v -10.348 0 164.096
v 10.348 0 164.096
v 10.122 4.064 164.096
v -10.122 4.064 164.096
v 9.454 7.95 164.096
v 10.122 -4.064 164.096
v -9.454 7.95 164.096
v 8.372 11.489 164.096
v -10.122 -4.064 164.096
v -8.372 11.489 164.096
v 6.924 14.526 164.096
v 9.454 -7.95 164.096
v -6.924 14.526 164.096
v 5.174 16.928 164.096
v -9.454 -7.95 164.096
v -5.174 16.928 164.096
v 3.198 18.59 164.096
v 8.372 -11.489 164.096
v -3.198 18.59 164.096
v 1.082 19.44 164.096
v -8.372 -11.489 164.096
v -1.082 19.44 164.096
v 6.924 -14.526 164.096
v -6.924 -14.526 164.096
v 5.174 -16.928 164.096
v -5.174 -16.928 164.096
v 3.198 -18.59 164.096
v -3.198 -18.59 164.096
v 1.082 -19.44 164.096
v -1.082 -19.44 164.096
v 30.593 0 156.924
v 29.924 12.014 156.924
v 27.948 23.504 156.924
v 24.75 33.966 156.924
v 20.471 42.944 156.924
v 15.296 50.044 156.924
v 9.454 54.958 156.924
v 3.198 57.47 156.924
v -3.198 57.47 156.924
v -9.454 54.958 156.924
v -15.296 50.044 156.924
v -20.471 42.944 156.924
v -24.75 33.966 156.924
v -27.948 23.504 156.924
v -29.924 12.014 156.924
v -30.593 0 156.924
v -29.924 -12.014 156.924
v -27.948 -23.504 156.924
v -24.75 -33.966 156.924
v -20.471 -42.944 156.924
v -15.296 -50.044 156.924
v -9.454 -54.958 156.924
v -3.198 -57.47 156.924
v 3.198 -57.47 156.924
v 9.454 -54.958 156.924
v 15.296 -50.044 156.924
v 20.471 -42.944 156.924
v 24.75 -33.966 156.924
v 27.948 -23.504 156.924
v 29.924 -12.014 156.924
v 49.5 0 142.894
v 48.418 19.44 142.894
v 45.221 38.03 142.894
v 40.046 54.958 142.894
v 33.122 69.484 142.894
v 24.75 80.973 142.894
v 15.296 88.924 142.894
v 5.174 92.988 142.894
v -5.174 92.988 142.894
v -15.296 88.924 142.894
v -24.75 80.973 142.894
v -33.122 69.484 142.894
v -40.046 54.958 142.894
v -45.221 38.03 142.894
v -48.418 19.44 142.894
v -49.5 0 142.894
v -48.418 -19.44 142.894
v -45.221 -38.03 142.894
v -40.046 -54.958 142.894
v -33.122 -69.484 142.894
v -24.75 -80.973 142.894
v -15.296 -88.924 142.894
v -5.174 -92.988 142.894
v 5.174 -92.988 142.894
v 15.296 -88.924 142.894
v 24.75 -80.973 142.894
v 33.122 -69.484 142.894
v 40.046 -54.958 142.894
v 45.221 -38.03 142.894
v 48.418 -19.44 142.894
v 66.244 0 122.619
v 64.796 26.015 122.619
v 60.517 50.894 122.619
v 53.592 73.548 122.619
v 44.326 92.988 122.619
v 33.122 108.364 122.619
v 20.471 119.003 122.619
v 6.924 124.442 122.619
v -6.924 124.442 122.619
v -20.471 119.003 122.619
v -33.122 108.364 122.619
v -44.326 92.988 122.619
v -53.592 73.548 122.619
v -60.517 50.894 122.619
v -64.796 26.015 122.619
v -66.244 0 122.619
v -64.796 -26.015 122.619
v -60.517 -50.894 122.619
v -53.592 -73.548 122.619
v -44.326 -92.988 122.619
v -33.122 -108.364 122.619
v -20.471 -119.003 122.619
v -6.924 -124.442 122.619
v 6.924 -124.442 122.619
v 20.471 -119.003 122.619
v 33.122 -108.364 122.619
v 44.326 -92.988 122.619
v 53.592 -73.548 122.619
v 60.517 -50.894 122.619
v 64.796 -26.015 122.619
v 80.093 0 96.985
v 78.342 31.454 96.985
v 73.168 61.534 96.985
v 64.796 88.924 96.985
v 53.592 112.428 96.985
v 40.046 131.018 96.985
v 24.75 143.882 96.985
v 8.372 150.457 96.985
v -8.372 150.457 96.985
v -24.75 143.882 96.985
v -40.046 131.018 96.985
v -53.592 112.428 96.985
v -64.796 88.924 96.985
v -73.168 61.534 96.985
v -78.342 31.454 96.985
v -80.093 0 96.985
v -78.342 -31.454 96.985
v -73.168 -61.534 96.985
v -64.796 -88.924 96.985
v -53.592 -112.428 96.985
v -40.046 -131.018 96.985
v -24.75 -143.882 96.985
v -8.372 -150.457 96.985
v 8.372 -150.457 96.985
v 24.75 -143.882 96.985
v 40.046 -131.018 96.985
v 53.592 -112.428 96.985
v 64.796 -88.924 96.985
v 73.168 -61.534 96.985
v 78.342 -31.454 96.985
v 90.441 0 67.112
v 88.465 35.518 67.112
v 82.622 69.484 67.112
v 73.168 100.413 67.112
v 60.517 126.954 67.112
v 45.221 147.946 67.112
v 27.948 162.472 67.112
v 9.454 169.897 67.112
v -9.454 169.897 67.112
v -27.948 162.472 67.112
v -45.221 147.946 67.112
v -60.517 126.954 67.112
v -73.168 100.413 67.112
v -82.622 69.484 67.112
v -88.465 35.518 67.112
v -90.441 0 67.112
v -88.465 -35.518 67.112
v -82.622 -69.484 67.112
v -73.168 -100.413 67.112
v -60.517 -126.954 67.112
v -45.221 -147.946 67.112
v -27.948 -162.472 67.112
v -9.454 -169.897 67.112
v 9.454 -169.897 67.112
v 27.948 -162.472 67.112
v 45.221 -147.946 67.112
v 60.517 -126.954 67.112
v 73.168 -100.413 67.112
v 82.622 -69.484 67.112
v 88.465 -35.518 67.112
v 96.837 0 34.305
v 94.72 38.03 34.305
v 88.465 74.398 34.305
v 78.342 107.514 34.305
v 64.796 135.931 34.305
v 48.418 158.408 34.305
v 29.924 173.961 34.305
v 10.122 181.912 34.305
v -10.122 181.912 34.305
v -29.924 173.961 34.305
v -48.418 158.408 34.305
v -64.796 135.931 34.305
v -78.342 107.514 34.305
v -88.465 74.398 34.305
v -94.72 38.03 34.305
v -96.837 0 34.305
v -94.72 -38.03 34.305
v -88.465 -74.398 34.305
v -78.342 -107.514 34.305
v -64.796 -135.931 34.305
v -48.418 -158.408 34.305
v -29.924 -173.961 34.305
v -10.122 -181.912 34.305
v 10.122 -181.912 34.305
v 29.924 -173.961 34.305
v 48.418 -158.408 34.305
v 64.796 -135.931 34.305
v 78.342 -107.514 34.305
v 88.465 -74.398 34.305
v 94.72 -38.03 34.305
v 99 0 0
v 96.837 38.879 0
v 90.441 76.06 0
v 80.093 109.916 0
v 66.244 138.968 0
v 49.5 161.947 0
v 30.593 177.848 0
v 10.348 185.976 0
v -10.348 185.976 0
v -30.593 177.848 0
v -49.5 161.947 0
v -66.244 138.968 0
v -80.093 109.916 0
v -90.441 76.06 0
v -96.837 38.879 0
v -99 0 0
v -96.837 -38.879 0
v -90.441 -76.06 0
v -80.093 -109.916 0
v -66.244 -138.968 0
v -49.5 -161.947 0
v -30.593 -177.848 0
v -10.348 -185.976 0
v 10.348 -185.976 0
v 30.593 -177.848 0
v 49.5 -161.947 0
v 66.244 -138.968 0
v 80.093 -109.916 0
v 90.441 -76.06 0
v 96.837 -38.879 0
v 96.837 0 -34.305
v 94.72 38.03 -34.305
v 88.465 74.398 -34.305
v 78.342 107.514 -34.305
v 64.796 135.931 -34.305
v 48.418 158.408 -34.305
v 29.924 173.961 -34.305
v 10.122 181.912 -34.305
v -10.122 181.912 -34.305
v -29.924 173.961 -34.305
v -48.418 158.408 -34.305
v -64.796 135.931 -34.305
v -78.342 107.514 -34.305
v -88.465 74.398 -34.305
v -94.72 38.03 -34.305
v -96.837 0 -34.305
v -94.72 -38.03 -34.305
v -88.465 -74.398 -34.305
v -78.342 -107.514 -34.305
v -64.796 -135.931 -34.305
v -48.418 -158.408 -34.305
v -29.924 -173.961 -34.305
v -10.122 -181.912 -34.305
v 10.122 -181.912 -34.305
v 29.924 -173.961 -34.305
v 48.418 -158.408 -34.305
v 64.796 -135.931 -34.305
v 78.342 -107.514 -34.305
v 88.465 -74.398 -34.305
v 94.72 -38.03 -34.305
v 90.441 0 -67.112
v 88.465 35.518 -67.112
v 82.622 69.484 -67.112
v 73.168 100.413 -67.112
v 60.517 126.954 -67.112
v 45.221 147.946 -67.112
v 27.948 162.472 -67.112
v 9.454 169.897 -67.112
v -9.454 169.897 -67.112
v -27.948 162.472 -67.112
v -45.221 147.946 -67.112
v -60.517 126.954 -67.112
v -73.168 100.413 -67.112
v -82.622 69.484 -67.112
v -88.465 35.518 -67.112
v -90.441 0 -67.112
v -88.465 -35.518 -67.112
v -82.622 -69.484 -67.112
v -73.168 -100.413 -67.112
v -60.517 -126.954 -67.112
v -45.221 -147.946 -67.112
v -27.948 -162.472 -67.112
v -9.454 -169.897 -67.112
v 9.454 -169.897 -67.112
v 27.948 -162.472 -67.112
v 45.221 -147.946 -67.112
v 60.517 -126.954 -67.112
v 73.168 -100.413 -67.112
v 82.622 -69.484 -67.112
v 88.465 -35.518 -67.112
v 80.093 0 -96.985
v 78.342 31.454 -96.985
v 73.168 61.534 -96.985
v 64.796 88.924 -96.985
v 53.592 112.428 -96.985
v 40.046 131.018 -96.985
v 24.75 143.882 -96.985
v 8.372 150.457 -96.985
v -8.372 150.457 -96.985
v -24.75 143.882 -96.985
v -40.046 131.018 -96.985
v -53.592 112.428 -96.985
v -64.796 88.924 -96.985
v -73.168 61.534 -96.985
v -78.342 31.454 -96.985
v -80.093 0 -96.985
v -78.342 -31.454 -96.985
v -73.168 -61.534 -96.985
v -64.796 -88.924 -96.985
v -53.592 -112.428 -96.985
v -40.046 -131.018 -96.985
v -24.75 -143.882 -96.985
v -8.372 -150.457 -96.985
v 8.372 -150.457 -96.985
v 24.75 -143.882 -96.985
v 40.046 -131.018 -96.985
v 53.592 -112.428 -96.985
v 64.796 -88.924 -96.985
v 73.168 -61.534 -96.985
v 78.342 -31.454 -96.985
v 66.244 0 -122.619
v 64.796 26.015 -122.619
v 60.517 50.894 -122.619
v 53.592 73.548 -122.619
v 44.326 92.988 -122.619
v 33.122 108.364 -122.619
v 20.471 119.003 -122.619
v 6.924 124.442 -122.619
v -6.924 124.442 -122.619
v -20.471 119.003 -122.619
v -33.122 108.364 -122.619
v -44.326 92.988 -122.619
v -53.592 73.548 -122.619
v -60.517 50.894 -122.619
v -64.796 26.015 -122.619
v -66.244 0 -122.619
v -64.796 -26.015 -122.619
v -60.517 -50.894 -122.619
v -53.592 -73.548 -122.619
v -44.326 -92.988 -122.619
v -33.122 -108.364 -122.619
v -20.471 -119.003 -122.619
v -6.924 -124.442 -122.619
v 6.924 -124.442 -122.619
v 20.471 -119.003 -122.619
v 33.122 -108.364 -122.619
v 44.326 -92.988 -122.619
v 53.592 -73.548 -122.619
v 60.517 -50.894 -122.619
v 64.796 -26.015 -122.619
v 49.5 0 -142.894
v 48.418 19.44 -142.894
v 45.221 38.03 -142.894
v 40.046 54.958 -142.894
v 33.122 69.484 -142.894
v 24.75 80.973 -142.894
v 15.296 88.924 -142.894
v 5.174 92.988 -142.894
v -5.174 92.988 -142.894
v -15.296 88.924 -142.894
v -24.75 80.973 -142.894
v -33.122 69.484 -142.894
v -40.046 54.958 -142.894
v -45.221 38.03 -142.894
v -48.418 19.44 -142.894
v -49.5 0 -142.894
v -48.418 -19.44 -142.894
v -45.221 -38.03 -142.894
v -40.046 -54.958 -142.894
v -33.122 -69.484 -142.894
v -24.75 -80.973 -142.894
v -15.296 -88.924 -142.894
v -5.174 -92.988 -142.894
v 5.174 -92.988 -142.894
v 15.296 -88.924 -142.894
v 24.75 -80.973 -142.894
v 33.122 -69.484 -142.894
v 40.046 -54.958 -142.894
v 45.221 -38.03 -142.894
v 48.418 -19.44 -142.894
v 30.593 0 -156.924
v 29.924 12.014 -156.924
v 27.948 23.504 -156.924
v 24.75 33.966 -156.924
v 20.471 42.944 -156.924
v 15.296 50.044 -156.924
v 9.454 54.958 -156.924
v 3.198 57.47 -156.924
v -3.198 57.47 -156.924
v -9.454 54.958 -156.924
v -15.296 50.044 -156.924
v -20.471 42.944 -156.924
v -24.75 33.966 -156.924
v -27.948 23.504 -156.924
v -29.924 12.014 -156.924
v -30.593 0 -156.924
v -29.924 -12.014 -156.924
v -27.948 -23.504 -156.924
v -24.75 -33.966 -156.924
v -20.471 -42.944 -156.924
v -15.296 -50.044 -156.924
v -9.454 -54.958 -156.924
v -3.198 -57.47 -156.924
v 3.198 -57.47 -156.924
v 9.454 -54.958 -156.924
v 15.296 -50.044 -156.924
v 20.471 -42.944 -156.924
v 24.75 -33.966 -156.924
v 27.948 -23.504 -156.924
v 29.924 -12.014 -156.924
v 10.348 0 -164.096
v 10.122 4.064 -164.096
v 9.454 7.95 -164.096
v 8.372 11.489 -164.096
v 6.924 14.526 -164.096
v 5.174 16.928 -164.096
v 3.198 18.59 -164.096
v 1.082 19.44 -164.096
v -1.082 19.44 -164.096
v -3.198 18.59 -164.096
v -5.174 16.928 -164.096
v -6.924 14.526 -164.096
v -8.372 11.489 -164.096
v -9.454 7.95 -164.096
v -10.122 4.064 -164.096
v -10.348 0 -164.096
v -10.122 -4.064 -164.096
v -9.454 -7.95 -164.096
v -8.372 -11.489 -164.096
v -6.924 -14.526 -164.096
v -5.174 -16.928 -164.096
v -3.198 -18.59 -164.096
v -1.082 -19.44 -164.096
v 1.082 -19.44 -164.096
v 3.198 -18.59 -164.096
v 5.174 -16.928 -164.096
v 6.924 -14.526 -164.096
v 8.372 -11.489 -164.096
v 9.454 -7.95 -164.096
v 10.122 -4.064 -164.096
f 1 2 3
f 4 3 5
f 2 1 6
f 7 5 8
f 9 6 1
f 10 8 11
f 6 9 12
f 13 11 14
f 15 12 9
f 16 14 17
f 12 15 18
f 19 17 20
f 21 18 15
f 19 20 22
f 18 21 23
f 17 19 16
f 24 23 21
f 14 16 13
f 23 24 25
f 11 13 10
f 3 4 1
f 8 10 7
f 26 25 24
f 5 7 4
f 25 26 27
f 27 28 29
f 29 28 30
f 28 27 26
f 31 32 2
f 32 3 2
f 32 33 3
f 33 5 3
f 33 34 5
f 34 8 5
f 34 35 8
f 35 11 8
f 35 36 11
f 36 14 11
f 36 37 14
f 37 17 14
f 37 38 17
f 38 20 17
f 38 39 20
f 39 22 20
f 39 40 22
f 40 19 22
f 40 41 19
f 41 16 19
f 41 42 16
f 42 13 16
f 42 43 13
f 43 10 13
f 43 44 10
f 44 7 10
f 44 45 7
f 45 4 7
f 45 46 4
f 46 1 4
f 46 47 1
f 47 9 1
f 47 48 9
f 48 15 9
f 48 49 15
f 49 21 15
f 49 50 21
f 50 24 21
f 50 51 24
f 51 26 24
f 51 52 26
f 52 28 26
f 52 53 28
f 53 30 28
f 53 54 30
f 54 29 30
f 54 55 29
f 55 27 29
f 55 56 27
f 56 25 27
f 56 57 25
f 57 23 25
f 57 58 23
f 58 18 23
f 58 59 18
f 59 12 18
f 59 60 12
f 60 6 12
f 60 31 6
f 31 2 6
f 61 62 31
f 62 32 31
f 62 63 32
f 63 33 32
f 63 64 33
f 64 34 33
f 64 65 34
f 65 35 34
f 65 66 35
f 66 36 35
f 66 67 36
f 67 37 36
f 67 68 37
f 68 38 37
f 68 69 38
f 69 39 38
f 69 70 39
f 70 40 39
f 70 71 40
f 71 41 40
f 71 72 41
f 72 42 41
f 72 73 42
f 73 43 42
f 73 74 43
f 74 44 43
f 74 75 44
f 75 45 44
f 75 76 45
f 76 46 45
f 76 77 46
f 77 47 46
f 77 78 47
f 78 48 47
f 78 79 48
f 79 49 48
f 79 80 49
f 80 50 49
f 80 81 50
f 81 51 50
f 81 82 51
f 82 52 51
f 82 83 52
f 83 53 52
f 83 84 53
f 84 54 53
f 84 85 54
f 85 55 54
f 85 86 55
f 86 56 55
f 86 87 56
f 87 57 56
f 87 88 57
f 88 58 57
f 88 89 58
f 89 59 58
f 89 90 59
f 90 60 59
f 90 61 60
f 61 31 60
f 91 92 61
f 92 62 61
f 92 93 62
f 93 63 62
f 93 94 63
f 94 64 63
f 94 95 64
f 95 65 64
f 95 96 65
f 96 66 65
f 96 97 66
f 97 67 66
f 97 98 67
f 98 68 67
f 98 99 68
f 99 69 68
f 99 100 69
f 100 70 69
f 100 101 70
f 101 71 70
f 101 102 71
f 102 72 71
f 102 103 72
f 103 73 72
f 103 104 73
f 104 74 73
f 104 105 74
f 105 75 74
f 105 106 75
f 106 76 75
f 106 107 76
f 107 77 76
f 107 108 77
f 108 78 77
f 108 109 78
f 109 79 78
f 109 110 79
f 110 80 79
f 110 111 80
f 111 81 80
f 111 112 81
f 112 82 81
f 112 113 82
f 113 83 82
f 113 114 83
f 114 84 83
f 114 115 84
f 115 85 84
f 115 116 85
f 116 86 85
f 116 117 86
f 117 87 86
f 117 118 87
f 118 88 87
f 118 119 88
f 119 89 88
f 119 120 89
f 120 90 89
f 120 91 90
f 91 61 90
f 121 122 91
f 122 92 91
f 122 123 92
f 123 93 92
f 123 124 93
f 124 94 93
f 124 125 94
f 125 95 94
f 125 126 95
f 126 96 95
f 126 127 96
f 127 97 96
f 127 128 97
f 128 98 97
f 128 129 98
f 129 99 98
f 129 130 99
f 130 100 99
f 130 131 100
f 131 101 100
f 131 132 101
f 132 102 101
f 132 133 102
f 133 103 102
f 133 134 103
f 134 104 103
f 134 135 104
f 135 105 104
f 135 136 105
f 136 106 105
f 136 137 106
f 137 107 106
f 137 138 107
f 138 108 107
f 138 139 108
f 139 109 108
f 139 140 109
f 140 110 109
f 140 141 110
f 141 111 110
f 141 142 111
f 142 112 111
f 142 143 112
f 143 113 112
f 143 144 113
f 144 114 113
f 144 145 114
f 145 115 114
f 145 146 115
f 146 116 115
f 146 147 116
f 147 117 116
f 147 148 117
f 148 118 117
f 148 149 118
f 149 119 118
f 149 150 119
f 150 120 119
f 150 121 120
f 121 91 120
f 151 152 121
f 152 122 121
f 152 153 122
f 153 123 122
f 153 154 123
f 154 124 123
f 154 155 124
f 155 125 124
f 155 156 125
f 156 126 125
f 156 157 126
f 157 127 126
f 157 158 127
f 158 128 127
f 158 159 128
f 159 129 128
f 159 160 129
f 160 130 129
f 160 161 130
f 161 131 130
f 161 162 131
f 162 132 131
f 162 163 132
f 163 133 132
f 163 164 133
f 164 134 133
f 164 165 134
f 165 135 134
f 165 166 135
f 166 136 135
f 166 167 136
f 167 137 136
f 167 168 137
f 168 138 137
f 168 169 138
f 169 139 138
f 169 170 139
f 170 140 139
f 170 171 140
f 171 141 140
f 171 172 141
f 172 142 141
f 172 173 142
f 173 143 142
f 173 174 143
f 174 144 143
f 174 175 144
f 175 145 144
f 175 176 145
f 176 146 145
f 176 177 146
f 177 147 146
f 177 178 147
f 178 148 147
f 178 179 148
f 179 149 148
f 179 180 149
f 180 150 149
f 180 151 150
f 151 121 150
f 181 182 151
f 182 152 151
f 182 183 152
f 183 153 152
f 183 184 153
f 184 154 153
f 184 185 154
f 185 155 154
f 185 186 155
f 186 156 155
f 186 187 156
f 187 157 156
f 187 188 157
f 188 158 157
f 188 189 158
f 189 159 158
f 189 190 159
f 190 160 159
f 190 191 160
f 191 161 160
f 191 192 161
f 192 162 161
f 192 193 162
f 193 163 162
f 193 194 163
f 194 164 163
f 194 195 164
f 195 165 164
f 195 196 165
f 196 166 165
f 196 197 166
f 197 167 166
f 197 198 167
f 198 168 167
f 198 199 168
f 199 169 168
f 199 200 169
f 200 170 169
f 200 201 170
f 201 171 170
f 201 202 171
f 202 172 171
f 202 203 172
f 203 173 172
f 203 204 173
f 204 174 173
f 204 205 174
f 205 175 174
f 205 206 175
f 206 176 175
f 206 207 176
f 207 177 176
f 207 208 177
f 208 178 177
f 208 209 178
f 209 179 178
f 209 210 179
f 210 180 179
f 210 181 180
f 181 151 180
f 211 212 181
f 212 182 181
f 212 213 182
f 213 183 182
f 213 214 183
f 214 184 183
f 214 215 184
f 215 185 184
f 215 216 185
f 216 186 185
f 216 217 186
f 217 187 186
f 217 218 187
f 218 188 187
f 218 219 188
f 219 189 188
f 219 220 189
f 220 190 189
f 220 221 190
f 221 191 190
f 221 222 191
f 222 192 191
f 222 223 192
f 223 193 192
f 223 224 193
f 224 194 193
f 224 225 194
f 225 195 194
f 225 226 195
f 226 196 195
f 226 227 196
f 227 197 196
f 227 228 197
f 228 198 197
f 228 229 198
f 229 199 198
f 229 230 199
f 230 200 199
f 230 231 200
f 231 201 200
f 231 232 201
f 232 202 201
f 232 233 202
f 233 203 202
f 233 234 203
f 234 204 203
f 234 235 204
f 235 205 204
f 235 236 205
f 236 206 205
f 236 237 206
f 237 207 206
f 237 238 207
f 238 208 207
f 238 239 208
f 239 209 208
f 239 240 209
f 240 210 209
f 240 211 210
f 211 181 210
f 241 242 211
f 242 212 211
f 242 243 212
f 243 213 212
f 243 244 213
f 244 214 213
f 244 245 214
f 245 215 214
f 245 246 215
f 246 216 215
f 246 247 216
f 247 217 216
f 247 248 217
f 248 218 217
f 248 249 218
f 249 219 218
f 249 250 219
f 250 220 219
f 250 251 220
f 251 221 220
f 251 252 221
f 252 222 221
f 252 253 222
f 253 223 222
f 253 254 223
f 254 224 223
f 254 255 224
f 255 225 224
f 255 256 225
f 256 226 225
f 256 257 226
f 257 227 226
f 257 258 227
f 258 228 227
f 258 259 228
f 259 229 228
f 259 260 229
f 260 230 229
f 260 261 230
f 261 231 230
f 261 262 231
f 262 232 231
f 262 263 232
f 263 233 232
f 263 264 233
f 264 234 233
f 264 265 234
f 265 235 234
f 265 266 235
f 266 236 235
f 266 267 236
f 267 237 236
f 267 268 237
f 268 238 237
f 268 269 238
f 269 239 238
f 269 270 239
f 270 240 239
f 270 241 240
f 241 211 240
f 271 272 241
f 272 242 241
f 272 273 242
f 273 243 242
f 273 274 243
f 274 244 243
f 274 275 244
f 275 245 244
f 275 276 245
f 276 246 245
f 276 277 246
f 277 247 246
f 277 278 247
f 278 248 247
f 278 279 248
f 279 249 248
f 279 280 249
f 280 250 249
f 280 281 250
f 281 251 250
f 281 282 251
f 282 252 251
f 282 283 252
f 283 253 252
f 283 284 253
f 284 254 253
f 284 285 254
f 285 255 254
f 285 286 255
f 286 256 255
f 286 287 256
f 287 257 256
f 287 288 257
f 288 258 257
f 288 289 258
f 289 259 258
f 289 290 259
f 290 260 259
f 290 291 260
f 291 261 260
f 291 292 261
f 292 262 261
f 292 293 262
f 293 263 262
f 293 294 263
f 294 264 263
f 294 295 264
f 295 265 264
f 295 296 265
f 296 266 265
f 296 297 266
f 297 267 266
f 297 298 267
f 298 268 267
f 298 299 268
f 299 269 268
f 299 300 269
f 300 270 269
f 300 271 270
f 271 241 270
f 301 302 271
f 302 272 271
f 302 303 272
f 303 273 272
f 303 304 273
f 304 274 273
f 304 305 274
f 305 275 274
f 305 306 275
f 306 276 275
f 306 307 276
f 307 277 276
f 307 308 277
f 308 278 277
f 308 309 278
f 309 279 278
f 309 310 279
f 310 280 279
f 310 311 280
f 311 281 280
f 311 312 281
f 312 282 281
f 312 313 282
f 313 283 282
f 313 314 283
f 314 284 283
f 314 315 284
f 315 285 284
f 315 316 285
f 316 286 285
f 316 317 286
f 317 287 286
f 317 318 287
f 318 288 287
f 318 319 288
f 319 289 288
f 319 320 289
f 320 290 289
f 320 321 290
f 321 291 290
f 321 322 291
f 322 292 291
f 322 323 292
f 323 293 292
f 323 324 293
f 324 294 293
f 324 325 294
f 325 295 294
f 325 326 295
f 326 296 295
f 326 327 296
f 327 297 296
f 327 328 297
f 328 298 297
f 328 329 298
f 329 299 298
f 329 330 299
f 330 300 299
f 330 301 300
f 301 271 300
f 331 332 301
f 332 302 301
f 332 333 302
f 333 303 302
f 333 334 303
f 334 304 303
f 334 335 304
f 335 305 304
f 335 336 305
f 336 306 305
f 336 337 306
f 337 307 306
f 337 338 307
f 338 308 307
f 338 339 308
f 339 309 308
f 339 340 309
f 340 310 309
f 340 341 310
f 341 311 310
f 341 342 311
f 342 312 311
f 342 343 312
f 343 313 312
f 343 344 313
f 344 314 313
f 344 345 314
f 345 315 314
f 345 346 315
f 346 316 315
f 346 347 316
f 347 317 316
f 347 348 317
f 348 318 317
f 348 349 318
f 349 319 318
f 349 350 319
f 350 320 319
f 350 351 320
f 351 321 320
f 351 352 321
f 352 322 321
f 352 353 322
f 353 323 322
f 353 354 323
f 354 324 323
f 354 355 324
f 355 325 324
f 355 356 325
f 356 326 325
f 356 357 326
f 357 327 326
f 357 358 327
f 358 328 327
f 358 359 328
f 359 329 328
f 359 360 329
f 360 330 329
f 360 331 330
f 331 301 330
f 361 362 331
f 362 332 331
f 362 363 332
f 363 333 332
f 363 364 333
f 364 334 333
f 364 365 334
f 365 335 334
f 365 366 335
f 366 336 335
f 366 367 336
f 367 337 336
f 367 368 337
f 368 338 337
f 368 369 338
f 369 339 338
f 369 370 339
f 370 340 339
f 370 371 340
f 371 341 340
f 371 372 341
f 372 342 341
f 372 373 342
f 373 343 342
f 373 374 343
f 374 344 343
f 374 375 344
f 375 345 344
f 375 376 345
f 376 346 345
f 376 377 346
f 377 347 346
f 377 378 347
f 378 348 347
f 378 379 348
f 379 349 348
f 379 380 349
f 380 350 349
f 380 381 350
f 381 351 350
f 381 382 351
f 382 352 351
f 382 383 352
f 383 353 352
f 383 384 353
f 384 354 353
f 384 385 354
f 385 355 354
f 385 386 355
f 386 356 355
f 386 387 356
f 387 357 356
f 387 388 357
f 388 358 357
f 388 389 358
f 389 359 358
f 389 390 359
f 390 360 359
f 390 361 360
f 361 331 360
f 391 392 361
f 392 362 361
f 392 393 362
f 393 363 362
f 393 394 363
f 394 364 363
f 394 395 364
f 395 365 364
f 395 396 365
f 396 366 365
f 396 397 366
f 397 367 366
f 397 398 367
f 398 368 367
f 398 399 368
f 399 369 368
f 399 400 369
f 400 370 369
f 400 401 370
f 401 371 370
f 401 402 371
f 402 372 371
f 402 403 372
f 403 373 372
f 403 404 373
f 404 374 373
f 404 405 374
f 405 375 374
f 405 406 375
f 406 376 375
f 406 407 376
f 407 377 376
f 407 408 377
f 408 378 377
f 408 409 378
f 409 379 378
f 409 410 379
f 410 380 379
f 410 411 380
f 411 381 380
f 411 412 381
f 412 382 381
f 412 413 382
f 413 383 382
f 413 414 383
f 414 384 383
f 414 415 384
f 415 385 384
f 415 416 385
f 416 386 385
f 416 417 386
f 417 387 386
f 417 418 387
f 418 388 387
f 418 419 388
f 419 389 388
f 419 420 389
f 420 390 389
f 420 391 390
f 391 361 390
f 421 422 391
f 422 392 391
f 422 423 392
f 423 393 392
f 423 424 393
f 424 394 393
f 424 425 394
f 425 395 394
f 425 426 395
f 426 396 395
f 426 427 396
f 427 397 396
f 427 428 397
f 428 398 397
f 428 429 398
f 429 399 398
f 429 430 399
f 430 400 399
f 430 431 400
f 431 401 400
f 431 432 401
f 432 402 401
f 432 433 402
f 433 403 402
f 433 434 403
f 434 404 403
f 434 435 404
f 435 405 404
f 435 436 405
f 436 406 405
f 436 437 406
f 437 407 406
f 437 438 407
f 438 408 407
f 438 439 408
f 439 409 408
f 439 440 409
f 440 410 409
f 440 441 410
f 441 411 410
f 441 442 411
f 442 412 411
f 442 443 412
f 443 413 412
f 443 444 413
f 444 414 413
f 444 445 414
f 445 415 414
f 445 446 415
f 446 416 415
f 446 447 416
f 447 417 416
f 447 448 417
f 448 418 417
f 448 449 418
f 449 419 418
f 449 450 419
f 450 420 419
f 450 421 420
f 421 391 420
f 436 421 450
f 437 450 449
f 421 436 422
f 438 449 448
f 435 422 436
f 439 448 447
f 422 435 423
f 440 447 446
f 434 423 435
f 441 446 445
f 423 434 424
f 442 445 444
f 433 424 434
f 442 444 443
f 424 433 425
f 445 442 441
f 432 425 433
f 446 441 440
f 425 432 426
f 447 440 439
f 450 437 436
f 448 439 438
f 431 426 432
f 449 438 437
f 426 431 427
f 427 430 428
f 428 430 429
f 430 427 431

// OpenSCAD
// Generated by SolidPython 1.0.1 on 2020-07-29 00:46:49


scale(v = [9, 17, 15]) {
	sphere(r = 11);
}
/***********************************************
*********      SolidPython code:      **********
************************************************
 
# import packages: SolidPython
from solid import *
from solid.utils import *
from itertools import chain, combinations, permutations


class Resize:

    def __init__(self, scad_file):
        self.scad_file = scad_file
        #self.scad_file = import_scad(scad_file)
        # cone/cylinder param:
        self.r1 = 0
        self.r2 = 0
        self.h = 0
        # rectangular prism param:
        self.w = 0
        self.l = 0
        # ellipse param:
        self.r = 0

    # import OpenScad code (file name corresponds to shape)


    # classify shape + parameters
    def assign(self, param1, param2, param3):
        if self.scad_file == 'cone.scad':
            self.r1 = param1
            self.r2 = param2
            self.h = param3
        elif self.scad_file == 'cylinder.scad':
            self.r1 = param1
            self.r2 = param2
            self.h = param3
        elif self.scad_file == 'rectangularPrism.scad':
            self.h = param1
            self.l = param2
            self.w = param3
        else:
            self.r = param1
            self.h = param2

    # resize parameters
    def iterate(self):
        x = range(3, 20, 2)
        i = 1
        if self.scad_file == 'cone.scad':
            tempList = list(permutations(x, 2))
            for temp in tempList:
                param1 = temp[0]
                param2 = temp[1]
                filepath = 'produced_scad_files/' + 'cone' + str(param1) + '_' + str(param2) + '_' + '.scad'
                scad_render_to_file(cylinder(h=param1, r1=param2, r2=0), filepath)

        elif self.scad_file == 'cylinder.scad':
            tempList = list(permutations(x, 3))
            for temp in tempList:
                param1 = temp[0]
                param2 = temp[1]
                filepath = 'produced_scad_files/' + 'cylinder' + str(param1) + '_' + str(param2) + '_' + '.scad'
                scad_render_to_file(cylinder(h=param1, r1=param2, r2=param2), filepath)

        elif self.scad_file == 'rectangularPrism.scad':
            tempList = list(permutations(x, 3))
            for temp in tempList:
                param1 = temp[0]
                param2 = temp[1]
                param3 = temp[2]
                filepath = 'produced_scad_files/' + 'rectangularPrism' + str(param1) + '_' + str(param2) + '_' + str(
                    param3) + '.scad'
                scad_render_to_file(cube(size=(param1, param2, param3)), filepath)

        elif self.scad_file == 'ellipse.scad':
            tempList = list(permutations(x, 4))
            for temp in tempList:
                param1 = temp[0]
                param2 = temp[1]
                param3 = temp[2]
                param4 = temp[3]
                filepath = 'produced_scad_files/' + 'ellipse' + str(param1) + '_' + str(param2) + '_' + str(param3) + '_' + str(param4) + '.scad'
                scad_render_to_file(scale([param1, param2, param3])(sphere(r=param4)), filepath)

    def render_to_scadfile(self):
        scad_render_to_file(scad, 'example.scad') 
 
************************************************/
